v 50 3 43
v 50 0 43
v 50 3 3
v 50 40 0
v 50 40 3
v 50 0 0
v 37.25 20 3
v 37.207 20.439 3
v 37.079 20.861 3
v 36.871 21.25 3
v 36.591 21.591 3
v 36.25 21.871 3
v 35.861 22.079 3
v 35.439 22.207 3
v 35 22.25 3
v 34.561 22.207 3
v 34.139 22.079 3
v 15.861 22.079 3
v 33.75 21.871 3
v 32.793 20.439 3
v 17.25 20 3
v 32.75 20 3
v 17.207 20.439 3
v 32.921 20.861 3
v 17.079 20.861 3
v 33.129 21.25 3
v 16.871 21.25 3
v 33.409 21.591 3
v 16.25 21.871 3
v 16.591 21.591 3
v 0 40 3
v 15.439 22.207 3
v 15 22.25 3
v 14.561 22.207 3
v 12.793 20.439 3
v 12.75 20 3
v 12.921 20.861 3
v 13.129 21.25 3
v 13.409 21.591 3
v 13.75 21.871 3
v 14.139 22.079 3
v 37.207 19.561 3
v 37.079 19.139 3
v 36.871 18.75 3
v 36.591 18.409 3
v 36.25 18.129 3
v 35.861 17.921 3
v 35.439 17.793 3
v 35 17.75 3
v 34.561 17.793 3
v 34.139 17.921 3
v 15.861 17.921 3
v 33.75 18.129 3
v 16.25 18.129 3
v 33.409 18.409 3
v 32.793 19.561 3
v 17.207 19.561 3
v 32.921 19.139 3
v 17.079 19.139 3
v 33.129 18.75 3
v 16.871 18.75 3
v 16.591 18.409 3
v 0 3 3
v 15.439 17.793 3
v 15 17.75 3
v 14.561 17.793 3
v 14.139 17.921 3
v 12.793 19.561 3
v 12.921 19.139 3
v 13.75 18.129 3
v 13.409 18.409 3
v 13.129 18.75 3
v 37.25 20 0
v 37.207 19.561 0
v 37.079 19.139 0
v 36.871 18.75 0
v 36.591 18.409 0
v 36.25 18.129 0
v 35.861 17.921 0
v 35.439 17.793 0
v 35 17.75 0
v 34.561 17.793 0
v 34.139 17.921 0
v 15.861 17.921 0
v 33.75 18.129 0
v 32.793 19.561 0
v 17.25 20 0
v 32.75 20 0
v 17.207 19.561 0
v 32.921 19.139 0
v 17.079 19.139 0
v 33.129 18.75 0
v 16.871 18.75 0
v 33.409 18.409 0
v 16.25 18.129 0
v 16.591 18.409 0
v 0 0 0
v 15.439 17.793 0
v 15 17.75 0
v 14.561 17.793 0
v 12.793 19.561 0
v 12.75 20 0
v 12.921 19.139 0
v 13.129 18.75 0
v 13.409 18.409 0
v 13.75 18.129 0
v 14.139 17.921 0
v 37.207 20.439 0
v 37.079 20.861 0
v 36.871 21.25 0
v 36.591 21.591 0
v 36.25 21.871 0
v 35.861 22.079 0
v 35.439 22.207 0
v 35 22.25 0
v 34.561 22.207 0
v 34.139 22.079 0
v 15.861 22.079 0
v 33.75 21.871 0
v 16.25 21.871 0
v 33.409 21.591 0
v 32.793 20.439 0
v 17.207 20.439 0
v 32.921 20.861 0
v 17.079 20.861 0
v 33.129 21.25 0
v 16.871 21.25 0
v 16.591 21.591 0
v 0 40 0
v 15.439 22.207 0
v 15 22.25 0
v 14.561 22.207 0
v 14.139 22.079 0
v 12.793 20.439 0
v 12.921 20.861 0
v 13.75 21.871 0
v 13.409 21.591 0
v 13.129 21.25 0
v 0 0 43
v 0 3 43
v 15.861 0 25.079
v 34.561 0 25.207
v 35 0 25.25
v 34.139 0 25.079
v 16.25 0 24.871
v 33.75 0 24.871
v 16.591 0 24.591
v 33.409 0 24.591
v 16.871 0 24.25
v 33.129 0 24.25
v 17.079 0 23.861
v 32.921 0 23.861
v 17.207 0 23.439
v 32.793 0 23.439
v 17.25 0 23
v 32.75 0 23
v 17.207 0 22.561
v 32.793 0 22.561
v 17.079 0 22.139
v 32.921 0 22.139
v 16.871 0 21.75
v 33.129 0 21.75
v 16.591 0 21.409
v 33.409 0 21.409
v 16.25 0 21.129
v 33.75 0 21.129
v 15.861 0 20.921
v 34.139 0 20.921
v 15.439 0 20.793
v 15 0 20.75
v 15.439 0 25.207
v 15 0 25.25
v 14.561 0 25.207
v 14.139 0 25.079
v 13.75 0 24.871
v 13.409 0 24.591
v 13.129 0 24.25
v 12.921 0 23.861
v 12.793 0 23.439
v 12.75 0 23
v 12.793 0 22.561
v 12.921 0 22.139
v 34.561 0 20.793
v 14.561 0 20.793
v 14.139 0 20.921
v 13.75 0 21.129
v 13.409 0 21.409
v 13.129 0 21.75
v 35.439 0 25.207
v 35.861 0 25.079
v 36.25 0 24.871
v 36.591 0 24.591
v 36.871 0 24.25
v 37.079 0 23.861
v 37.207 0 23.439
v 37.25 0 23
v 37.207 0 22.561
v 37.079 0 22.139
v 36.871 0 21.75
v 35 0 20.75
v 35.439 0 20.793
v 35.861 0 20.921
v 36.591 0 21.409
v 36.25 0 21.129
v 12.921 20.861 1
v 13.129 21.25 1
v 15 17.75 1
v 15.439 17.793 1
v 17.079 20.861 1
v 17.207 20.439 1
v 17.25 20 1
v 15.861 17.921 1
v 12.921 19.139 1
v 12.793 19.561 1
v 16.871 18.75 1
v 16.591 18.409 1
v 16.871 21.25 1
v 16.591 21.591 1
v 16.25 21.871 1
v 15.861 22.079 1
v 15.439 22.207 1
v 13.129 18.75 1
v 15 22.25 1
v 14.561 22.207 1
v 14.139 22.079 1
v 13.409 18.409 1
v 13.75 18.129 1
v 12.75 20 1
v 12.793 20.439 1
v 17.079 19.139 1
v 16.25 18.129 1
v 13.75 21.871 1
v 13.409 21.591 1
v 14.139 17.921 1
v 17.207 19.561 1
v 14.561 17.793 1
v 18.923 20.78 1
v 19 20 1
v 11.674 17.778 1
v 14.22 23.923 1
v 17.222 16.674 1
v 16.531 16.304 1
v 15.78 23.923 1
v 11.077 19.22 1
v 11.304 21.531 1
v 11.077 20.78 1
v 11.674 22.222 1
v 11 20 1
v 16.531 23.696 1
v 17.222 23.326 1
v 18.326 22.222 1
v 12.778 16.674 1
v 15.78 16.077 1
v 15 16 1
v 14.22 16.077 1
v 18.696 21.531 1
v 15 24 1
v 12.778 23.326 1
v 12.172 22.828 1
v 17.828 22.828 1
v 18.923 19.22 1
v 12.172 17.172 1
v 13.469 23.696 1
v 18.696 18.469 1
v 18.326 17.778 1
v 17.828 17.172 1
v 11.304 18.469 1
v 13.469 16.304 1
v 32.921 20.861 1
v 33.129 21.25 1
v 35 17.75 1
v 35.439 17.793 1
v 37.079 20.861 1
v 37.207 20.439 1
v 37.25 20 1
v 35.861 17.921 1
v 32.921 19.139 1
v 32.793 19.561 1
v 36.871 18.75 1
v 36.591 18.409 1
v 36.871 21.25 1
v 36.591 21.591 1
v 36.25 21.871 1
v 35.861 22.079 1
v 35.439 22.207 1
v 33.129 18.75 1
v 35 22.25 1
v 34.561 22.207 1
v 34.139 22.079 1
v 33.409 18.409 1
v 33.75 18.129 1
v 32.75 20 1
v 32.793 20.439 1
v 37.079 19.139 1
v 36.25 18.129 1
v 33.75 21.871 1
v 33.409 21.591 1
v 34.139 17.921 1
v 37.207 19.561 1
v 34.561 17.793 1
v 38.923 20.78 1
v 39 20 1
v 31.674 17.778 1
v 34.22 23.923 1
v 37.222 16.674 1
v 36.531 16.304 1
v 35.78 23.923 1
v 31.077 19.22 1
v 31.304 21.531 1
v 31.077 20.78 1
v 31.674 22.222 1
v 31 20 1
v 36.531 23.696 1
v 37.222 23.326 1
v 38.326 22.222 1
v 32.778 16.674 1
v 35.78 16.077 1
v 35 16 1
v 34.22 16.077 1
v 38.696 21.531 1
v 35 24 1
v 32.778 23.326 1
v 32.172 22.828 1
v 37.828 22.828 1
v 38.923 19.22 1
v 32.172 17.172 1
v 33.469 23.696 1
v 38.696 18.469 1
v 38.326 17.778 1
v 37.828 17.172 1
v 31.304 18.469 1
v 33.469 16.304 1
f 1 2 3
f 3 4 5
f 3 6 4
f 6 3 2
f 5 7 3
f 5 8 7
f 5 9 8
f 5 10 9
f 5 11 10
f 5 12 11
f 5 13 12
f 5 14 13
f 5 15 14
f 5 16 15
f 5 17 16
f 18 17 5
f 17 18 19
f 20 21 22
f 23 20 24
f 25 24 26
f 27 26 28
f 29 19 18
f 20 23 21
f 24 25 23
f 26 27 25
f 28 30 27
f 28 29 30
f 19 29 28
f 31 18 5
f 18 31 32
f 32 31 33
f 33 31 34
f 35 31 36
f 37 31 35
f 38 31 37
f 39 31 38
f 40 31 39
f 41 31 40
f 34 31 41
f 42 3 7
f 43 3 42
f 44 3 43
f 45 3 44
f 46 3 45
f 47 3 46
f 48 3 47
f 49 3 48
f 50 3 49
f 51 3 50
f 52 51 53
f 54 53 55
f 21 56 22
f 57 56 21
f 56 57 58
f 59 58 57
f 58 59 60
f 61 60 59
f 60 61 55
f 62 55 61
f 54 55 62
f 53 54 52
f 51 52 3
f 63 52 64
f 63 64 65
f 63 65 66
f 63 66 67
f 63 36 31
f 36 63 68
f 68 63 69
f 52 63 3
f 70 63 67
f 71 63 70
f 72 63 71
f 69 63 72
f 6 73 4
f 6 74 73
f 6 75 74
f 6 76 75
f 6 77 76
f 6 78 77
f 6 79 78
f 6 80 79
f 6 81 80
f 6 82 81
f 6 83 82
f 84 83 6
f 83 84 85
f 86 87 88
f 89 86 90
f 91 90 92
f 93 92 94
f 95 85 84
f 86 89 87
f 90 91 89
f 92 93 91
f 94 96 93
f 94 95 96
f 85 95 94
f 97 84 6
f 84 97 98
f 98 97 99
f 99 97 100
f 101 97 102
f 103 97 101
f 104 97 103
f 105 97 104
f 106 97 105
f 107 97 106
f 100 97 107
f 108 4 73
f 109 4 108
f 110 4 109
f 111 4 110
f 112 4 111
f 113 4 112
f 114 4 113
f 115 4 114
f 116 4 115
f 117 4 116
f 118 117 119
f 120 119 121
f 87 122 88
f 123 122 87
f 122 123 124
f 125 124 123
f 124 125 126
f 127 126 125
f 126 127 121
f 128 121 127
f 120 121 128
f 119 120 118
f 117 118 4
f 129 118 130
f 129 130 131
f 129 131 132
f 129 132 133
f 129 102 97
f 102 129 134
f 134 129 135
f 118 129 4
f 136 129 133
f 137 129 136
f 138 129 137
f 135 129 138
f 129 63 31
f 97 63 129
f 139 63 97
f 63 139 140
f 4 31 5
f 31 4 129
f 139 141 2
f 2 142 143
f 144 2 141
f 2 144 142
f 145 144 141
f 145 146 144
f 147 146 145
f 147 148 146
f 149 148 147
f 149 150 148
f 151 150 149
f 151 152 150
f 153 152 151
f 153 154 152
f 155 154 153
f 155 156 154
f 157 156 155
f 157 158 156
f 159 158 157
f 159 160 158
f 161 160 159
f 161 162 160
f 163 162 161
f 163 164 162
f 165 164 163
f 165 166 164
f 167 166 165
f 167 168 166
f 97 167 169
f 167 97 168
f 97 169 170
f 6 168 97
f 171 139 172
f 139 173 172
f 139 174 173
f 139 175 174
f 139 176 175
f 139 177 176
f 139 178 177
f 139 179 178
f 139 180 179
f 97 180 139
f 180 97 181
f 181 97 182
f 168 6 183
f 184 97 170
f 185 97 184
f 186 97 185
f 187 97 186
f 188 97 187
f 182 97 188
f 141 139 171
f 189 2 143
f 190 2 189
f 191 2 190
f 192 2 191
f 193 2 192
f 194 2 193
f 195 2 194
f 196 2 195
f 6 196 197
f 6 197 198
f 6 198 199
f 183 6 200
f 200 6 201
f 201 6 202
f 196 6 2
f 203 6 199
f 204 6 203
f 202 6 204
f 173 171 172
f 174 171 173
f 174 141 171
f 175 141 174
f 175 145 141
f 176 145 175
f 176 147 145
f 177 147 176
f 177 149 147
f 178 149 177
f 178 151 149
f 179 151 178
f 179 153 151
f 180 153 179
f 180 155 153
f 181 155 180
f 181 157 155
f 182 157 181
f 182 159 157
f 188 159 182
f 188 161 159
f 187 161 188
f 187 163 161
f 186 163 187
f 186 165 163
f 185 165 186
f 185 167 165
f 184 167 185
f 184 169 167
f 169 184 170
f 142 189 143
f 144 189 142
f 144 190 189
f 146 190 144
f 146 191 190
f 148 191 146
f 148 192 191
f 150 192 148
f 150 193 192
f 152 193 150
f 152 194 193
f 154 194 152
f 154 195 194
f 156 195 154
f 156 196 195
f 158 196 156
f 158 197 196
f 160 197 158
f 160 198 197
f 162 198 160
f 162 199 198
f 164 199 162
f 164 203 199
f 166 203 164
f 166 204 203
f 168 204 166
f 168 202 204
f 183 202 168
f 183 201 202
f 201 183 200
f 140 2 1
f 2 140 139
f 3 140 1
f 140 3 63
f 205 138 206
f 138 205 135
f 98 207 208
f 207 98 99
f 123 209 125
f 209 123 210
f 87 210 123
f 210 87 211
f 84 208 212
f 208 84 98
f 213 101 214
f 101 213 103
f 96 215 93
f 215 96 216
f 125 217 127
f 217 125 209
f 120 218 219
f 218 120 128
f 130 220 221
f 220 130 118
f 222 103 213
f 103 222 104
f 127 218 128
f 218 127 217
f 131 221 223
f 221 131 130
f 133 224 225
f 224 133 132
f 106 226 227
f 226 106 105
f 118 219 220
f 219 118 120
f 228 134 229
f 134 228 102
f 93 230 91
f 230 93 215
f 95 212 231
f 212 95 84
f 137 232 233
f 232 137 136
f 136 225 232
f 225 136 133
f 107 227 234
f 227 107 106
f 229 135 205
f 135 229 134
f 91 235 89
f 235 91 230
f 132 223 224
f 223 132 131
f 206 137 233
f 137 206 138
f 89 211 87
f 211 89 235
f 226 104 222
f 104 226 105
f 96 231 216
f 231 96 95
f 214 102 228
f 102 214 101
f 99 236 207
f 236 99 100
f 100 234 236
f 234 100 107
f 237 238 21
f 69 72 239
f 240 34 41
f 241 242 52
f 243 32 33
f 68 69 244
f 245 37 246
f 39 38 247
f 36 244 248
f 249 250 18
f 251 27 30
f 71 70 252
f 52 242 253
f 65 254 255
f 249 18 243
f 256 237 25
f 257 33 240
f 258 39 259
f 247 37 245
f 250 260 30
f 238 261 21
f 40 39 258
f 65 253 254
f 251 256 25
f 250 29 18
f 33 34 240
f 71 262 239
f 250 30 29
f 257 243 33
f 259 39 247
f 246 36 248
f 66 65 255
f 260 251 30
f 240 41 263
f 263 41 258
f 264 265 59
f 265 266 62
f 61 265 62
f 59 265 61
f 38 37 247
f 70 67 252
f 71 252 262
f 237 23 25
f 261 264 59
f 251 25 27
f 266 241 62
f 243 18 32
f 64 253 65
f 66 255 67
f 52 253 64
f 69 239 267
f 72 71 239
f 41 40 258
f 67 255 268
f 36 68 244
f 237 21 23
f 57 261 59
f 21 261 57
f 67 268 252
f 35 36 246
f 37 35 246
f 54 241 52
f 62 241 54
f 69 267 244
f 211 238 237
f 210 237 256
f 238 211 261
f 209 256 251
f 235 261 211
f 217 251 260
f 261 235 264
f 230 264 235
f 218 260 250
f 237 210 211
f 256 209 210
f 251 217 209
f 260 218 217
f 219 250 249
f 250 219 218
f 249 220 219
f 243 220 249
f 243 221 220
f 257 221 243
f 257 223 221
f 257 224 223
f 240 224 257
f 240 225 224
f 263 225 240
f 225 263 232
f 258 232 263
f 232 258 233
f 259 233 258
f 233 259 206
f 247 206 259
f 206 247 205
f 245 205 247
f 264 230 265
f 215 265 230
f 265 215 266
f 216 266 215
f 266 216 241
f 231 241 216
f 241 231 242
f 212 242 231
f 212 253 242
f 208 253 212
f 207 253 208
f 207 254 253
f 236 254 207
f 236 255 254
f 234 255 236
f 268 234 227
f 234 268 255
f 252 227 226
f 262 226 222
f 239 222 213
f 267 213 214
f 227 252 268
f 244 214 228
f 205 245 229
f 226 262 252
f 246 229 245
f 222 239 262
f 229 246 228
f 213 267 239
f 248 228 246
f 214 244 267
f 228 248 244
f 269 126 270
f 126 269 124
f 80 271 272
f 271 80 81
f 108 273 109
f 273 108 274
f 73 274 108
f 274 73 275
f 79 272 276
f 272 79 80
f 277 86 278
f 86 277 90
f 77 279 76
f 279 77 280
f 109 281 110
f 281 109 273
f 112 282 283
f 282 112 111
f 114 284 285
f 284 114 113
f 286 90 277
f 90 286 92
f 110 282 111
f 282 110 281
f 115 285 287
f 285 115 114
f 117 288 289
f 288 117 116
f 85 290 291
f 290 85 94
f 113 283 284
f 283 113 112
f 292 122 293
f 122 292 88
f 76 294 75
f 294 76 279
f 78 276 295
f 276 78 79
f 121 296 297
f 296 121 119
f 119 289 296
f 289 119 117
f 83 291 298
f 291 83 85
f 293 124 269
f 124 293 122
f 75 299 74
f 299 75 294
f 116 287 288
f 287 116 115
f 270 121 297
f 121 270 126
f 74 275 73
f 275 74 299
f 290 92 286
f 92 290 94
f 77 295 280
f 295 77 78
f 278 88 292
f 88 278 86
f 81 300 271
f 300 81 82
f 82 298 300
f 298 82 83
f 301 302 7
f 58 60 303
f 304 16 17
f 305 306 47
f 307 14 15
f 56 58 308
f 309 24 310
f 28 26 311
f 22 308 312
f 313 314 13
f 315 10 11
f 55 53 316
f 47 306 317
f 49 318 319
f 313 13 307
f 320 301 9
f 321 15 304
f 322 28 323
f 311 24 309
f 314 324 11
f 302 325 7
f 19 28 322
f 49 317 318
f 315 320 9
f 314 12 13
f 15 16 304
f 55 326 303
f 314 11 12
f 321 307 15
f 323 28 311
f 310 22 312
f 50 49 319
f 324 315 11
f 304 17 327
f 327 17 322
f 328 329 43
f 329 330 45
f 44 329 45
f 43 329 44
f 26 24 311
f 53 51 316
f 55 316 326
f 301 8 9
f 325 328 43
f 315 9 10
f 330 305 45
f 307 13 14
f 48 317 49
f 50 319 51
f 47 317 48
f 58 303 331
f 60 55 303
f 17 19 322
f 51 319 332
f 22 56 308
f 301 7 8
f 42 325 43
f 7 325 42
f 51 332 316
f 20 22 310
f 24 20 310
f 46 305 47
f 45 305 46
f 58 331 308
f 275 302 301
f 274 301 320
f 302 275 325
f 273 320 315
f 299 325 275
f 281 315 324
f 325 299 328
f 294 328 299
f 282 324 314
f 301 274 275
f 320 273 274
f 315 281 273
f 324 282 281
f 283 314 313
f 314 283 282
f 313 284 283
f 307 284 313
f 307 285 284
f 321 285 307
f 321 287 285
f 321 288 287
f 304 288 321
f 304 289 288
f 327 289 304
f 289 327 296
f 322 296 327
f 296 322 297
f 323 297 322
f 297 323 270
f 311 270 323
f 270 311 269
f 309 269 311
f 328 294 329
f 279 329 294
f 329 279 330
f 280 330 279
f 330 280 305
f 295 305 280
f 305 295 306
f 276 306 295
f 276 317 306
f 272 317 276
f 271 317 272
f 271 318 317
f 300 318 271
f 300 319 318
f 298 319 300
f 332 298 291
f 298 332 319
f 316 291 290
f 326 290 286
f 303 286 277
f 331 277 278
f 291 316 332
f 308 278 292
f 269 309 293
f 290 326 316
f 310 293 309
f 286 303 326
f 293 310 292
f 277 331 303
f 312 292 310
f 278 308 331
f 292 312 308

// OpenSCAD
// L-bracket with countersunk holes

module countersunk_hole(through_dia, counter_dia, counter_depth, total_depth) {
    translate([0, 0, -total_depth]) {
        cylinder(h = total_depth, d = through_dia, $fn = 32);
    }
    translate([0, 0, -counter_depth]) {
        cylinder(h = counter_depth, d1 = counter_dia, d2 = through_dia, $fn = 32);
    }
}

module l_bracket() {
    difference() {
        union() {
            // Horizontal flange
            cube([50, 40, 3]);
            
            // Vertical flange
            cube([50, 3, 43]);
        }
        
        // Horizontal flange holes
        translate([15, 20, 3]) {
            countersunk_hole(4.5, 8, 2, 3);
        }
        translate([35, 20, 3]) {
            countersunk_hole(4.5, 8, 2, 3);
        }
        
        // Vertical flange holes
        translate([15, 0, 23]) {
            rotate([-90, 0, 0]) {
                countersunk_hole(4.5, 8, 2, 3);
            }
        }
        translate([35, 0, 23]) {
            rotate([-90, 0, 0]) {
                countersunk_hole(4.5, 8, 2, 3);
            }
        }
    }
}

l_bracket();
